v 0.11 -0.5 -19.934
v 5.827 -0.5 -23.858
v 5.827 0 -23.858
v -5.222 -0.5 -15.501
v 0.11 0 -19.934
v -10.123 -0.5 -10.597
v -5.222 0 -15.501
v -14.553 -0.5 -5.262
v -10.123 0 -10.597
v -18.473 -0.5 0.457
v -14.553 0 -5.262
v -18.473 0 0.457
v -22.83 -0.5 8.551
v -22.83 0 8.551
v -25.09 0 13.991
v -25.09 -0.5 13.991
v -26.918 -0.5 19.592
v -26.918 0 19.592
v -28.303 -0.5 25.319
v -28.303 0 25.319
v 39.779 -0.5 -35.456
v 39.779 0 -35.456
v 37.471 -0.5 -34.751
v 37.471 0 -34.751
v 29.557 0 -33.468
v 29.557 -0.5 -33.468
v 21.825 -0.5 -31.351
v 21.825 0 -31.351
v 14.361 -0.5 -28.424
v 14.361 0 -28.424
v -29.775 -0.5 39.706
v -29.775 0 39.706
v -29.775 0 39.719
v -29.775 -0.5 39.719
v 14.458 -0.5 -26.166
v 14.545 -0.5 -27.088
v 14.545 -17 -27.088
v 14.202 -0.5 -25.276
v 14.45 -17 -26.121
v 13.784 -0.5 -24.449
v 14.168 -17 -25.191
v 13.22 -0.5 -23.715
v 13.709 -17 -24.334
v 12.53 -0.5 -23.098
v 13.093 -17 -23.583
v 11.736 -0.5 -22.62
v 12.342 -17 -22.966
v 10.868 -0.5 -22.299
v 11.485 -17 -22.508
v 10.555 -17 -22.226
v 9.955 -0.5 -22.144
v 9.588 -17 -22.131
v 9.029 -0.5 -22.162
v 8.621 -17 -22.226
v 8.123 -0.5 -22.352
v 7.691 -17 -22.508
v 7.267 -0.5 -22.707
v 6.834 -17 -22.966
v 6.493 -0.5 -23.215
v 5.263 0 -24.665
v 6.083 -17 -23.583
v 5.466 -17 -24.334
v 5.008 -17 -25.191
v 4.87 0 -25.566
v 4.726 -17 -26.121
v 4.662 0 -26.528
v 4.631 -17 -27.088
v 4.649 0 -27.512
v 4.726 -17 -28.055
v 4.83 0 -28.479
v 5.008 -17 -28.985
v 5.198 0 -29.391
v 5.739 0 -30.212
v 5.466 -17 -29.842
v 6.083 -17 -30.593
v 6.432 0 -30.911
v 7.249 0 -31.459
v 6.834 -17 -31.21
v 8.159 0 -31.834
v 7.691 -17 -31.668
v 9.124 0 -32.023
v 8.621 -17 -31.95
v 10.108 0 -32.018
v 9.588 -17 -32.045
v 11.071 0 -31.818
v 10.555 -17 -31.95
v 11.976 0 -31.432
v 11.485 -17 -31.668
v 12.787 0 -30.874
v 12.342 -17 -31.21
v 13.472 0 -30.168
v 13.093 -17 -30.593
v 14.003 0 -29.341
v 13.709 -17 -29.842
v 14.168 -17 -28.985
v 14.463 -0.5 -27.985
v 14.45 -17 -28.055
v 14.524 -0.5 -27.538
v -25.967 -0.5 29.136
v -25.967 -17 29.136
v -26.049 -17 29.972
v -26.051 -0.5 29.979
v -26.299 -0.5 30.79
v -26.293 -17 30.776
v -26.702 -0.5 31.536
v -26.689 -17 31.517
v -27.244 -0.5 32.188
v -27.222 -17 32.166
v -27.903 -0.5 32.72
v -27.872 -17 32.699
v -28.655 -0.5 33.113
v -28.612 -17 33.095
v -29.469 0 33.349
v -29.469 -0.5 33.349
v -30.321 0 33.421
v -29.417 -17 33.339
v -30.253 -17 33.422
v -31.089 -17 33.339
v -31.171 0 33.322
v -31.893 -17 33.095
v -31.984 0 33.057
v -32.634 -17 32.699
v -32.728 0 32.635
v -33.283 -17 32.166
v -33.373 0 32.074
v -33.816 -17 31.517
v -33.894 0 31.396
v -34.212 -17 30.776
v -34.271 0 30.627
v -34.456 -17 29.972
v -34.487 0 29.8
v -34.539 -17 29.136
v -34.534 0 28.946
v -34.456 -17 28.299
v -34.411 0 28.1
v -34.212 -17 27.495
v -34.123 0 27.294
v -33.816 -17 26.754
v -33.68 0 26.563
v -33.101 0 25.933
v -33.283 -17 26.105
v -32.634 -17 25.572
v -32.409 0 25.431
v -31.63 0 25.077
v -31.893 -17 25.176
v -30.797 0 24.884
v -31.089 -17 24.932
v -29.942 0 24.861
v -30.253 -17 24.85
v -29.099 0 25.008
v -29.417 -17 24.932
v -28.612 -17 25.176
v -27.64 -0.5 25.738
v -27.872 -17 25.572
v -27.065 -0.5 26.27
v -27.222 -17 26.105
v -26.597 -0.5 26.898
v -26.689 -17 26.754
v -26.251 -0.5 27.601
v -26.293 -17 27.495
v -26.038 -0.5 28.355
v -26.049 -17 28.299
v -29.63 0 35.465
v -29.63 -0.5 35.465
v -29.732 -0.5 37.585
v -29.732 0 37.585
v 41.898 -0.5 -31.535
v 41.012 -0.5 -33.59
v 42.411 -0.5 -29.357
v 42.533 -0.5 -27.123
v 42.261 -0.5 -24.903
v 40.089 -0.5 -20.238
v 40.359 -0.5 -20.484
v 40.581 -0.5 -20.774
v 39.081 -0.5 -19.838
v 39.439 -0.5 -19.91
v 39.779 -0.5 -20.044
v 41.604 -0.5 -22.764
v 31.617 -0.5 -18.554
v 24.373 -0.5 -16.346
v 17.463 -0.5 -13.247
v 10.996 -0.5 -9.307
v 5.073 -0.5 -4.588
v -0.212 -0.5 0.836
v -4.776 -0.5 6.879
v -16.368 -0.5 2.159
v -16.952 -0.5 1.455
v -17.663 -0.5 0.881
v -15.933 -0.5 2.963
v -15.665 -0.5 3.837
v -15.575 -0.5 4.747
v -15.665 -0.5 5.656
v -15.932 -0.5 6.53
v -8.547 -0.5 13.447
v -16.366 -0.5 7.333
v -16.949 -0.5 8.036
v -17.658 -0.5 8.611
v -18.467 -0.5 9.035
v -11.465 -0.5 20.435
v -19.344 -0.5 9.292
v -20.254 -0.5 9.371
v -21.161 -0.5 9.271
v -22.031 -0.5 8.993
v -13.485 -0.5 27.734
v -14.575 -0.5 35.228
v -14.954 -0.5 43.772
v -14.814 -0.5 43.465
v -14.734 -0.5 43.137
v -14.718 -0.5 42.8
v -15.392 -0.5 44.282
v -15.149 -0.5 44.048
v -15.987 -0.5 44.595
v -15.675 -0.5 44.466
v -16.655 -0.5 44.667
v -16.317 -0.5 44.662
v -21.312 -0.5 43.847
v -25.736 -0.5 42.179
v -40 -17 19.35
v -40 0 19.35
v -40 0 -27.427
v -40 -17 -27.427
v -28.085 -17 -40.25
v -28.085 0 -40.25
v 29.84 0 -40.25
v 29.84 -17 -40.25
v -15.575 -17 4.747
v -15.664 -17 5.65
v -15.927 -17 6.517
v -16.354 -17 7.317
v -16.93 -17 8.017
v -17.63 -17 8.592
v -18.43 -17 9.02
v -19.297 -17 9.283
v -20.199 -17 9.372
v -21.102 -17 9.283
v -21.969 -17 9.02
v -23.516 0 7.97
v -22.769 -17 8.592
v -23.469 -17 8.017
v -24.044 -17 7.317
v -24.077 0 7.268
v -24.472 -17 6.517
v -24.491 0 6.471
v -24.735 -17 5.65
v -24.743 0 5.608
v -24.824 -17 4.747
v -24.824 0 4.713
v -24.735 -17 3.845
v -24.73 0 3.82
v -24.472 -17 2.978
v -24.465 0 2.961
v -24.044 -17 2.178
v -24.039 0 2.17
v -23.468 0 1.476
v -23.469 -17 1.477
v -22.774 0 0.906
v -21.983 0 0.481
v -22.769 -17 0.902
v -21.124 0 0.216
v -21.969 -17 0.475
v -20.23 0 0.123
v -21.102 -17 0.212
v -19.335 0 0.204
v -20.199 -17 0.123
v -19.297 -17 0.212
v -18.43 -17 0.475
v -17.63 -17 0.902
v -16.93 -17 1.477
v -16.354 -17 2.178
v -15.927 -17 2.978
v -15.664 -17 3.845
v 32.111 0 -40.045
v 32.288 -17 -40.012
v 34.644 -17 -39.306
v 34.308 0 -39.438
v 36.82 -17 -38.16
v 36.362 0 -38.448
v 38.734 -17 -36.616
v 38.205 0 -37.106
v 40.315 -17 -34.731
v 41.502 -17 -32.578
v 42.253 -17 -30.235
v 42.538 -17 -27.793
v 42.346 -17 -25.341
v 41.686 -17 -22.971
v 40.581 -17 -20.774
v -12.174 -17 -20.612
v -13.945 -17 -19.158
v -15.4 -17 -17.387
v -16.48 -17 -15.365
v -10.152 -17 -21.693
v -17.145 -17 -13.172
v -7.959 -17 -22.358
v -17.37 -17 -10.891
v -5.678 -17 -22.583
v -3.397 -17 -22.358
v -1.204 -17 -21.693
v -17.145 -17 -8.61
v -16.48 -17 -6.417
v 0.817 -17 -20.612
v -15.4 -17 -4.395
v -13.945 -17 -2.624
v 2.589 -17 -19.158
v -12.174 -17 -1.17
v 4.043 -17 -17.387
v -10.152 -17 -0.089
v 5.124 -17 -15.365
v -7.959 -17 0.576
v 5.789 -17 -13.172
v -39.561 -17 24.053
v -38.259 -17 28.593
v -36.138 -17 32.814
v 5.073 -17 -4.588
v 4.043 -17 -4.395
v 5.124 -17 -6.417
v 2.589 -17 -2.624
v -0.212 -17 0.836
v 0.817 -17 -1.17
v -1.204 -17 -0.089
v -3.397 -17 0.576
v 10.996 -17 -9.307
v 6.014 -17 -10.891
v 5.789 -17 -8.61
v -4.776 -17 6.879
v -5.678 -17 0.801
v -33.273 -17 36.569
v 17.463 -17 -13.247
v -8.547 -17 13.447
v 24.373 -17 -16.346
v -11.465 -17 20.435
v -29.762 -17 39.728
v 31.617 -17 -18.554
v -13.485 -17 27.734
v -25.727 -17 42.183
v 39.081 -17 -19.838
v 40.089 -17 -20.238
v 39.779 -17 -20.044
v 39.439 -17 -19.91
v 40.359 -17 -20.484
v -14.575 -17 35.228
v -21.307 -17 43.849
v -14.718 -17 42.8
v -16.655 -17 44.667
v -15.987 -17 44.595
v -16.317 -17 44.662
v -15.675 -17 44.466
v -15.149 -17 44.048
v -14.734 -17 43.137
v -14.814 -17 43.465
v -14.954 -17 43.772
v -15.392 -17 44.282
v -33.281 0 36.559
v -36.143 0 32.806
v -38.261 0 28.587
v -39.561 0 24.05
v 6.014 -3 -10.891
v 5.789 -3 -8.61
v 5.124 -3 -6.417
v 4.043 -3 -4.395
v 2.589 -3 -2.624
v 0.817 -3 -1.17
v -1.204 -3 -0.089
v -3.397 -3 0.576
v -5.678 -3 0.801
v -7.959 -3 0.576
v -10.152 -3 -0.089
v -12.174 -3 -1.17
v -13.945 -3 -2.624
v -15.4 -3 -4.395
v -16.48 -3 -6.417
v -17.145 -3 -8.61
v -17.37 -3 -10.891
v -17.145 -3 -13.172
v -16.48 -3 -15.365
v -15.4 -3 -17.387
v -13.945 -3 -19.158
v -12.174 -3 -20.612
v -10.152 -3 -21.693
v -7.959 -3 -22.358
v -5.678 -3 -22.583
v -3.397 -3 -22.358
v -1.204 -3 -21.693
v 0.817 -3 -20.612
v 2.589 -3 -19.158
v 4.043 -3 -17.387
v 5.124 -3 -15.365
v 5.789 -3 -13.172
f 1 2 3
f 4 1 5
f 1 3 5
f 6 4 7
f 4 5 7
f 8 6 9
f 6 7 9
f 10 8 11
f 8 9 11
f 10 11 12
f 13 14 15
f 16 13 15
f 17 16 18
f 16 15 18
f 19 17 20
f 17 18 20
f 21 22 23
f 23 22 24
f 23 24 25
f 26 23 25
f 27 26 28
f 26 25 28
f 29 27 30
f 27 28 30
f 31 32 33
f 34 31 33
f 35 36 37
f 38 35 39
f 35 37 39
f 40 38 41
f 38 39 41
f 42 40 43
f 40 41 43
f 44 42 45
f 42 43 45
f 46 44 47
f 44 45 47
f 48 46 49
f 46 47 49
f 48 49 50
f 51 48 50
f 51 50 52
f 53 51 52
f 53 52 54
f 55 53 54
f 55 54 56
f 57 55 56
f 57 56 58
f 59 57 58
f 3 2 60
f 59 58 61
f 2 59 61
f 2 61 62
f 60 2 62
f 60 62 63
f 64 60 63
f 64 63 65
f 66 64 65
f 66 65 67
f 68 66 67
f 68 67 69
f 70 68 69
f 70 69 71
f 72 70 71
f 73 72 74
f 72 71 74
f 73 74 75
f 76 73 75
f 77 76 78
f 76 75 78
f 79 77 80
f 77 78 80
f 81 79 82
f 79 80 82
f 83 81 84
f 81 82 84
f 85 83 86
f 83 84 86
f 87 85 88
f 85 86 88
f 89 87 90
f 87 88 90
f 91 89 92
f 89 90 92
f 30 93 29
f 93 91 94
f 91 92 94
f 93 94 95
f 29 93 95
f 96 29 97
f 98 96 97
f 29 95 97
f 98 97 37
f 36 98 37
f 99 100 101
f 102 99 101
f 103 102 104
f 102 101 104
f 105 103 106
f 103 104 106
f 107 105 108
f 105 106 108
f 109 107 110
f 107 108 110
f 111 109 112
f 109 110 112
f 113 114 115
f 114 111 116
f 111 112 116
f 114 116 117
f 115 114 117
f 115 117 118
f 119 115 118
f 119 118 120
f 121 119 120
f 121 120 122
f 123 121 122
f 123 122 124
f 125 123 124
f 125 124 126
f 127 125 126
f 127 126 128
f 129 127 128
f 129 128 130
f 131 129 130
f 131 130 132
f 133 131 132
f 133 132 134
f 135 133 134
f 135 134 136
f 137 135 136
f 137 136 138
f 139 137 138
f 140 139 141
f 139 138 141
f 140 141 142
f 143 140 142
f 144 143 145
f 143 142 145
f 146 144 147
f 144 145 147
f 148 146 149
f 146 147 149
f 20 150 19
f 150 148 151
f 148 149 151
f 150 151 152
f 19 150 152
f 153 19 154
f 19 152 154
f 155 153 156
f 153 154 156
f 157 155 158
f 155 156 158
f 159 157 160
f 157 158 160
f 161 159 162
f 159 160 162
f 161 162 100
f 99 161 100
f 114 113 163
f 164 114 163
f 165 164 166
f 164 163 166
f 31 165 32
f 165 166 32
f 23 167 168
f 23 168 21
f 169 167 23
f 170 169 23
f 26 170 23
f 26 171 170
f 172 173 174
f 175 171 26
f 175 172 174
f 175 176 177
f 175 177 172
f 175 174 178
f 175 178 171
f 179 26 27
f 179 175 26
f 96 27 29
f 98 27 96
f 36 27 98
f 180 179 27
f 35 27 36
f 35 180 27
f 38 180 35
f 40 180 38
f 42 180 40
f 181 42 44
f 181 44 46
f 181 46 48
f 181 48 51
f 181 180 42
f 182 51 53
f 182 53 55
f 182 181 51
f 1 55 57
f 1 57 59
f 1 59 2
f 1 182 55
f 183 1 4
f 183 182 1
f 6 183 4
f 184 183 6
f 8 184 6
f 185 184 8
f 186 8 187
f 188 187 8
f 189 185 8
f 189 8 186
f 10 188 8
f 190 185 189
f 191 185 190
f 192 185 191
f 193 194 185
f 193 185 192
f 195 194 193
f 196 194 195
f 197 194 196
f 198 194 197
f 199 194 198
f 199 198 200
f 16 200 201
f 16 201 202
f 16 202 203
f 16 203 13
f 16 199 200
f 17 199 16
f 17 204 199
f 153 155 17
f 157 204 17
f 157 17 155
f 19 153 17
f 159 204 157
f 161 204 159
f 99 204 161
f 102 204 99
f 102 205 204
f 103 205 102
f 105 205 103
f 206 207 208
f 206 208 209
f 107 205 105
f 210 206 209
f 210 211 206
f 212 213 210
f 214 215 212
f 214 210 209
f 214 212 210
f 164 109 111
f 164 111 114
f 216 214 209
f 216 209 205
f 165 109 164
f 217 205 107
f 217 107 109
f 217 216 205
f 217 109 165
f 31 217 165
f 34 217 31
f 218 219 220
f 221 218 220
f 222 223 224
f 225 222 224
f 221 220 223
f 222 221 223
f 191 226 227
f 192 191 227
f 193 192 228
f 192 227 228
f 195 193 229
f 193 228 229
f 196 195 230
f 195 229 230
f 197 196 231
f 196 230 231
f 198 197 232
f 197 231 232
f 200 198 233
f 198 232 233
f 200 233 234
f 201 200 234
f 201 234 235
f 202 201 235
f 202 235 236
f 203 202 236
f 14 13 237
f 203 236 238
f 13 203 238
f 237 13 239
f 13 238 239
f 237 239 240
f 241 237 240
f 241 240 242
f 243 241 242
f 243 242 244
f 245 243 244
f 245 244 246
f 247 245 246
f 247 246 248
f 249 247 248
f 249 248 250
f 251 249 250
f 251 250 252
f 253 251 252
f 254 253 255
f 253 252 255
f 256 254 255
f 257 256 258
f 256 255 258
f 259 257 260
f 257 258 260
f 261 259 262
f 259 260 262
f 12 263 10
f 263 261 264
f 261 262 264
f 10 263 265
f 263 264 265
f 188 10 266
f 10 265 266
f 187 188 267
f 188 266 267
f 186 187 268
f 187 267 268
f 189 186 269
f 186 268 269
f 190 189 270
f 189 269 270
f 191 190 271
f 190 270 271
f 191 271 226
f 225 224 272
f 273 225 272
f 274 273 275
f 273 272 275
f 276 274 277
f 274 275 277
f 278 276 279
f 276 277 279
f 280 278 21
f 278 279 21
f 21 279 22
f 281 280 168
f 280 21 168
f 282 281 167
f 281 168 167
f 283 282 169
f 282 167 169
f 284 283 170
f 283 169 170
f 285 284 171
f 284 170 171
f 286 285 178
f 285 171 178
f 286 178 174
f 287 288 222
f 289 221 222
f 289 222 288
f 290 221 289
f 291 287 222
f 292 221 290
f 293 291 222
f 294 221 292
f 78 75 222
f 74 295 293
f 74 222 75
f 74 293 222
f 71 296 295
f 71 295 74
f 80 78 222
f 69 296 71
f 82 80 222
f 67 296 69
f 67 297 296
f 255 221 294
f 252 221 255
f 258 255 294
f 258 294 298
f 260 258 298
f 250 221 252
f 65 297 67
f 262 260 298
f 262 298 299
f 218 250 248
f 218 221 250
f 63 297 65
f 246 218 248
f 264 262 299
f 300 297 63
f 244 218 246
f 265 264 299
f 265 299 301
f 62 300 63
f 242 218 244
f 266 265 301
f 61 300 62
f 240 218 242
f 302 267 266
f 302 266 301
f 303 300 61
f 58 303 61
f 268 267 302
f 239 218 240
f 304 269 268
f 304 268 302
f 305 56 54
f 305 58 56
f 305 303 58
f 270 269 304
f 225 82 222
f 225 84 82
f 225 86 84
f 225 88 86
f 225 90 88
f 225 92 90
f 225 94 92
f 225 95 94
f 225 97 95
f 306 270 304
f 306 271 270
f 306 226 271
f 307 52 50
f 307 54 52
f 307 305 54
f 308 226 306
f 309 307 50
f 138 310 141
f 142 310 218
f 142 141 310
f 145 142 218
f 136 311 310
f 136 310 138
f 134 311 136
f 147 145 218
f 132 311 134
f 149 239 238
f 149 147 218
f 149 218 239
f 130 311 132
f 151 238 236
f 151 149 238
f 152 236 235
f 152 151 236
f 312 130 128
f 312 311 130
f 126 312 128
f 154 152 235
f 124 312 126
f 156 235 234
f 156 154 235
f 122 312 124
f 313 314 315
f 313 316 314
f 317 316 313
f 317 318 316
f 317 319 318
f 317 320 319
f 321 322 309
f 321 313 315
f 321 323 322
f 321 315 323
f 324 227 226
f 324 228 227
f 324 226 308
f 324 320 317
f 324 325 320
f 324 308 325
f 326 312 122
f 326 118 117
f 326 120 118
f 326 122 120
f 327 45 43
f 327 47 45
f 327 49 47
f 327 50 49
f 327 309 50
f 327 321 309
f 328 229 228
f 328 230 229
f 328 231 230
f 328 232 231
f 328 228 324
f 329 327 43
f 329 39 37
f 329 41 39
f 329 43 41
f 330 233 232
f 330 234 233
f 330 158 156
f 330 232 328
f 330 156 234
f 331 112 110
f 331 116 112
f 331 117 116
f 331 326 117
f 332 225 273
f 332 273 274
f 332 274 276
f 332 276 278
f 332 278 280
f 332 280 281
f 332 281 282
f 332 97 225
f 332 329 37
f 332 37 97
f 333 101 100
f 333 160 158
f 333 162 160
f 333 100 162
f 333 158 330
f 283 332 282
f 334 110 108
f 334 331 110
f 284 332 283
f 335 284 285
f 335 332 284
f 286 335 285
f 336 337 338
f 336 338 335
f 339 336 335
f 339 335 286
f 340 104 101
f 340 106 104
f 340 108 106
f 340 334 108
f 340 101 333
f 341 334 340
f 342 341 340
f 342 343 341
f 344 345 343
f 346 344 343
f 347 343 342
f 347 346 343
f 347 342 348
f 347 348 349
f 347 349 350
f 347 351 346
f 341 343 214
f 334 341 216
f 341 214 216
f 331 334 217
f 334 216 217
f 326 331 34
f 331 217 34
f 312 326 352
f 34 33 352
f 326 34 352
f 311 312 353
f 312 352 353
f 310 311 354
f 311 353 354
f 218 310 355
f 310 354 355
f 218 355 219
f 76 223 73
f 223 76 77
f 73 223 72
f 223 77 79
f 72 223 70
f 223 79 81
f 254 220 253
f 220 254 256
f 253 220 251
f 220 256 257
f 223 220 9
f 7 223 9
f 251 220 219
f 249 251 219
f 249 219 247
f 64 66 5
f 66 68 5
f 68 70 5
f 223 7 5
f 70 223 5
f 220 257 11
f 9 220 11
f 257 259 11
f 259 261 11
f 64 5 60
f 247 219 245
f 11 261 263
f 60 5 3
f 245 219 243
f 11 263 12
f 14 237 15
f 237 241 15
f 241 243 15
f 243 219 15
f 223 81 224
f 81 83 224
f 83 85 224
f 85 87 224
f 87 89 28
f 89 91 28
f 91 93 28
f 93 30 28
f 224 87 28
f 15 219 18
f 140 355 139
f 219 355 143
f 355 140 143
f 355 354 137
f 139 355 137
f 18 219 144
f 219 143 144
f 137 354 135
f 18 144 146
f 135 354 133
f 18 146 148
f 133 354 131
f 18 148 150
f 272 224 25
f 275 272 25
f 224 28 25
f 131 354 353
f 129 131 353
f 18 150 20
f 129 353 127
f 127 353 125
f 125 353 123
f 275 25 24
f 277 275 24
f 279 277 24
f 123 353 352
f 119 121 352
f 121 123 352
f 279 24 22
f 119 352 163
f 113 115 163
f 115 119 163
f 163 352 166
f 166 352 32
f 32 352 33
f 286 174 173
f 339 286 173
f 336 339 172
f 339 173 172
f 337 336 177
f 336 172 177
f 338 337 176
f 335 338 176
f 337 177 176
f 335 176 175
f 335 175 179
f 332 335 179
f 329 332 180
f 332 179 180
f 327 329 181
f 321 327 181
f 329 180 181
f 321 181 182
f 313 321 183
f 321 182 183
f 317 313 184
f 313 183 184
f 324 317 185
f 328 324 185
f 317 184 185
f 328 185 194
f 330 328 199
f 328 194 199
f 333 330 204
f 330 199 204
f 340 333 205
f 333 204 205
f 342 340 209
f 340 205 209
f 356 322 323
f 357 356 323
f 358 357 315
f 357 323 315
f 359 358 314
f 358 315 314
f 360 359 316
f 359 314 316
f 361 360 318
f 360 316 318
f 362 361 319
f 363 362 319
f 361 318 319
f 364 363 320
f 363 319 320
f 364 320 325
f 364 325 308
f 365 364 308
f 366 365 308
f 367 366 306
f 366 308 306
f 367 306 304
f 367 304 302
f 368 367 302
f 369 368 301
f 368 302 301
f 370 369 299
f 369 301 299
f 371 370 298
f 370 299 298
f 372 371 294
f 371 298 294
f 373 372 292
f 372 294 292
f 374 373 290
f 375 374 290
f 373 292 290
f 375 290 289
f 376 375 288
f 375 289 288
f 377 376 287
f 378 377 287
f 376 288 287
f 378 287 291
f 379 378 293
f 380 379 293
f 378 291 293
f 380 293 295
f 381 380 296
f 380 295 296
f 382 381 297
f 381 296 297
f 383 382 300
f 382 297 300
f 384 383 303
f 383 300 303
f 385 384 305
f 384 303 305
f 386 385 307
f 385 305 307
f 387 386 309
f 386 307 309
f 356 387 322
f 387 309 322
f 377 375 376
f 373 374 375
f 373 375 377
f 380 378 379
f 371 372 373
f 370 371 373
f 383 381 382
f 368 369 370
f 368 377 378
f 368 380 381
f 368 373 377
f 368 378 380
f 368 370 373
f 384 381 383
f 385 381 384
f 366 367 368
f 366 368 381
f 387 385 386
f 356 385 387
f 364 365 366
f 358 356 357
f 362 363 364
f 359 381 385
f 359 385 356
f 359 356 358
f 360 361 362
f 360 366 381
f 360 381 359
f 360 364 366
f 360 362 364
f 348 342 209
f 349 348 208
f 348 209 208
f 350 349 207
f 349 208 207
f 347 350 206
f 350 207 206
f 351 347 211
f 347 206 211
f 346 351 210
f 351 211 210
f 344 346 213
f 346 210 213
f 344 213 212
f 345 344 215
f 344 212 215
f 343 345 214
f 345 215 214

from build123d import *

# Parameters (mm, degrees)
F1_DEPTH = 17
F2_R     = 11.691727
F3_DEPTH = 14
F4_R     = 4.624372
F4_R_2   = 4.285959
F4_R_3   = 4.957168
F5_DEPTH = 25
F7_DEPTH = 0.5


with BuildPart() as f1:
    # F0 (on Front) → F1 (new body)
    with BuildSketch(Plane.XZ):
        with BuildLine():
            Line((-40, -27.427316), (-28.084865, -40.25))
            Line((-28.084865, -40.25), (29.84, -40.25))
            ThreePointArc((29.84, -40.25), (40.960822, -33.683297), (40.581307, -20.773989))
            ThreePointArc((40.581307, -20.773989), (39.938227, -20.134126), (39.080779, -19.837887))
            ThreePointArc((39.080779, -19.837887), (-0.21216, 0.836167), (-14.717551, 42.799785))
            ThreePointArc((-14.717551, 42.799785), (-15.264908, 44.170434), (-16.654855, 44.666745))
            ThreePointArc((-16.654855, 44.666745), (-33.272886, 36.568692), (-40, 19.35))
            Line((-40, 19.35), (-40, -27.427316))
        make_face()
    extrude(amount=F1_DEPTH)

    # F2 (on face) → F3 (cut)
    with BuildSketch(Plane.XZ.offset(17)):
        with Locations((-5.678192, -10.890958)):
            Circle(F2_R)
    extrude(amount=-F3_DEPTH, mode=Mode.SUBTRACT)

    # F4 (on face) → F5 (cut)
    with BuildSketch(Plane.XZ.offset(17)):
        with Locations((-20.199468, 4.74734)):
            Circle(F4_R)
        with Locations((-30.25266, 29.135641)):
            Circle(F4_R_2)
        with Locations((9.587764, -27.087769)):
            Circle(F4_R_3)
    extrude(amount=-F5_DEPTH, mode=Mode.SUBTRACT)

    # F6 (on face) → F7 (cut)
    with BuildSketch(Plane(origin=(0, 0, 0), x_dir=(-1, 0, 0), z_dir=(0, 1, 0))):
        with BuildLine():
            ThreePointArc((-37.470929, -34.75125), (10.350502, -10.34579), (29.774692, 39.706348))
            Line((29.774692, 39.706348), (29.774692, 45.691768))
            ThreePointArc((29.774692, 45.691768), (23.636454, 48.375894), (17.059354, 49.650356))
            Line((17.059354, 49.650356), (9.722393, 42.579803))
            ThreePointArc((9.722393, 42.579803), (-3.580862, 4.093924), (-39.617395, -14.866766))
            Line((-39.617395, -14.866766), (-44.810167, -18.106268))
            ThreePointArc((-44.810167, -18.106268), (-47.539999, -27.55), (-44.810167, -36.993732))
            Line((-44.810167, -36.993732), (-37.470929, -34.75125))
        make_face()
    extrude(amount=-F7_DEPTH, mode=Mode.SUBTRACT)


solid = f1.part
